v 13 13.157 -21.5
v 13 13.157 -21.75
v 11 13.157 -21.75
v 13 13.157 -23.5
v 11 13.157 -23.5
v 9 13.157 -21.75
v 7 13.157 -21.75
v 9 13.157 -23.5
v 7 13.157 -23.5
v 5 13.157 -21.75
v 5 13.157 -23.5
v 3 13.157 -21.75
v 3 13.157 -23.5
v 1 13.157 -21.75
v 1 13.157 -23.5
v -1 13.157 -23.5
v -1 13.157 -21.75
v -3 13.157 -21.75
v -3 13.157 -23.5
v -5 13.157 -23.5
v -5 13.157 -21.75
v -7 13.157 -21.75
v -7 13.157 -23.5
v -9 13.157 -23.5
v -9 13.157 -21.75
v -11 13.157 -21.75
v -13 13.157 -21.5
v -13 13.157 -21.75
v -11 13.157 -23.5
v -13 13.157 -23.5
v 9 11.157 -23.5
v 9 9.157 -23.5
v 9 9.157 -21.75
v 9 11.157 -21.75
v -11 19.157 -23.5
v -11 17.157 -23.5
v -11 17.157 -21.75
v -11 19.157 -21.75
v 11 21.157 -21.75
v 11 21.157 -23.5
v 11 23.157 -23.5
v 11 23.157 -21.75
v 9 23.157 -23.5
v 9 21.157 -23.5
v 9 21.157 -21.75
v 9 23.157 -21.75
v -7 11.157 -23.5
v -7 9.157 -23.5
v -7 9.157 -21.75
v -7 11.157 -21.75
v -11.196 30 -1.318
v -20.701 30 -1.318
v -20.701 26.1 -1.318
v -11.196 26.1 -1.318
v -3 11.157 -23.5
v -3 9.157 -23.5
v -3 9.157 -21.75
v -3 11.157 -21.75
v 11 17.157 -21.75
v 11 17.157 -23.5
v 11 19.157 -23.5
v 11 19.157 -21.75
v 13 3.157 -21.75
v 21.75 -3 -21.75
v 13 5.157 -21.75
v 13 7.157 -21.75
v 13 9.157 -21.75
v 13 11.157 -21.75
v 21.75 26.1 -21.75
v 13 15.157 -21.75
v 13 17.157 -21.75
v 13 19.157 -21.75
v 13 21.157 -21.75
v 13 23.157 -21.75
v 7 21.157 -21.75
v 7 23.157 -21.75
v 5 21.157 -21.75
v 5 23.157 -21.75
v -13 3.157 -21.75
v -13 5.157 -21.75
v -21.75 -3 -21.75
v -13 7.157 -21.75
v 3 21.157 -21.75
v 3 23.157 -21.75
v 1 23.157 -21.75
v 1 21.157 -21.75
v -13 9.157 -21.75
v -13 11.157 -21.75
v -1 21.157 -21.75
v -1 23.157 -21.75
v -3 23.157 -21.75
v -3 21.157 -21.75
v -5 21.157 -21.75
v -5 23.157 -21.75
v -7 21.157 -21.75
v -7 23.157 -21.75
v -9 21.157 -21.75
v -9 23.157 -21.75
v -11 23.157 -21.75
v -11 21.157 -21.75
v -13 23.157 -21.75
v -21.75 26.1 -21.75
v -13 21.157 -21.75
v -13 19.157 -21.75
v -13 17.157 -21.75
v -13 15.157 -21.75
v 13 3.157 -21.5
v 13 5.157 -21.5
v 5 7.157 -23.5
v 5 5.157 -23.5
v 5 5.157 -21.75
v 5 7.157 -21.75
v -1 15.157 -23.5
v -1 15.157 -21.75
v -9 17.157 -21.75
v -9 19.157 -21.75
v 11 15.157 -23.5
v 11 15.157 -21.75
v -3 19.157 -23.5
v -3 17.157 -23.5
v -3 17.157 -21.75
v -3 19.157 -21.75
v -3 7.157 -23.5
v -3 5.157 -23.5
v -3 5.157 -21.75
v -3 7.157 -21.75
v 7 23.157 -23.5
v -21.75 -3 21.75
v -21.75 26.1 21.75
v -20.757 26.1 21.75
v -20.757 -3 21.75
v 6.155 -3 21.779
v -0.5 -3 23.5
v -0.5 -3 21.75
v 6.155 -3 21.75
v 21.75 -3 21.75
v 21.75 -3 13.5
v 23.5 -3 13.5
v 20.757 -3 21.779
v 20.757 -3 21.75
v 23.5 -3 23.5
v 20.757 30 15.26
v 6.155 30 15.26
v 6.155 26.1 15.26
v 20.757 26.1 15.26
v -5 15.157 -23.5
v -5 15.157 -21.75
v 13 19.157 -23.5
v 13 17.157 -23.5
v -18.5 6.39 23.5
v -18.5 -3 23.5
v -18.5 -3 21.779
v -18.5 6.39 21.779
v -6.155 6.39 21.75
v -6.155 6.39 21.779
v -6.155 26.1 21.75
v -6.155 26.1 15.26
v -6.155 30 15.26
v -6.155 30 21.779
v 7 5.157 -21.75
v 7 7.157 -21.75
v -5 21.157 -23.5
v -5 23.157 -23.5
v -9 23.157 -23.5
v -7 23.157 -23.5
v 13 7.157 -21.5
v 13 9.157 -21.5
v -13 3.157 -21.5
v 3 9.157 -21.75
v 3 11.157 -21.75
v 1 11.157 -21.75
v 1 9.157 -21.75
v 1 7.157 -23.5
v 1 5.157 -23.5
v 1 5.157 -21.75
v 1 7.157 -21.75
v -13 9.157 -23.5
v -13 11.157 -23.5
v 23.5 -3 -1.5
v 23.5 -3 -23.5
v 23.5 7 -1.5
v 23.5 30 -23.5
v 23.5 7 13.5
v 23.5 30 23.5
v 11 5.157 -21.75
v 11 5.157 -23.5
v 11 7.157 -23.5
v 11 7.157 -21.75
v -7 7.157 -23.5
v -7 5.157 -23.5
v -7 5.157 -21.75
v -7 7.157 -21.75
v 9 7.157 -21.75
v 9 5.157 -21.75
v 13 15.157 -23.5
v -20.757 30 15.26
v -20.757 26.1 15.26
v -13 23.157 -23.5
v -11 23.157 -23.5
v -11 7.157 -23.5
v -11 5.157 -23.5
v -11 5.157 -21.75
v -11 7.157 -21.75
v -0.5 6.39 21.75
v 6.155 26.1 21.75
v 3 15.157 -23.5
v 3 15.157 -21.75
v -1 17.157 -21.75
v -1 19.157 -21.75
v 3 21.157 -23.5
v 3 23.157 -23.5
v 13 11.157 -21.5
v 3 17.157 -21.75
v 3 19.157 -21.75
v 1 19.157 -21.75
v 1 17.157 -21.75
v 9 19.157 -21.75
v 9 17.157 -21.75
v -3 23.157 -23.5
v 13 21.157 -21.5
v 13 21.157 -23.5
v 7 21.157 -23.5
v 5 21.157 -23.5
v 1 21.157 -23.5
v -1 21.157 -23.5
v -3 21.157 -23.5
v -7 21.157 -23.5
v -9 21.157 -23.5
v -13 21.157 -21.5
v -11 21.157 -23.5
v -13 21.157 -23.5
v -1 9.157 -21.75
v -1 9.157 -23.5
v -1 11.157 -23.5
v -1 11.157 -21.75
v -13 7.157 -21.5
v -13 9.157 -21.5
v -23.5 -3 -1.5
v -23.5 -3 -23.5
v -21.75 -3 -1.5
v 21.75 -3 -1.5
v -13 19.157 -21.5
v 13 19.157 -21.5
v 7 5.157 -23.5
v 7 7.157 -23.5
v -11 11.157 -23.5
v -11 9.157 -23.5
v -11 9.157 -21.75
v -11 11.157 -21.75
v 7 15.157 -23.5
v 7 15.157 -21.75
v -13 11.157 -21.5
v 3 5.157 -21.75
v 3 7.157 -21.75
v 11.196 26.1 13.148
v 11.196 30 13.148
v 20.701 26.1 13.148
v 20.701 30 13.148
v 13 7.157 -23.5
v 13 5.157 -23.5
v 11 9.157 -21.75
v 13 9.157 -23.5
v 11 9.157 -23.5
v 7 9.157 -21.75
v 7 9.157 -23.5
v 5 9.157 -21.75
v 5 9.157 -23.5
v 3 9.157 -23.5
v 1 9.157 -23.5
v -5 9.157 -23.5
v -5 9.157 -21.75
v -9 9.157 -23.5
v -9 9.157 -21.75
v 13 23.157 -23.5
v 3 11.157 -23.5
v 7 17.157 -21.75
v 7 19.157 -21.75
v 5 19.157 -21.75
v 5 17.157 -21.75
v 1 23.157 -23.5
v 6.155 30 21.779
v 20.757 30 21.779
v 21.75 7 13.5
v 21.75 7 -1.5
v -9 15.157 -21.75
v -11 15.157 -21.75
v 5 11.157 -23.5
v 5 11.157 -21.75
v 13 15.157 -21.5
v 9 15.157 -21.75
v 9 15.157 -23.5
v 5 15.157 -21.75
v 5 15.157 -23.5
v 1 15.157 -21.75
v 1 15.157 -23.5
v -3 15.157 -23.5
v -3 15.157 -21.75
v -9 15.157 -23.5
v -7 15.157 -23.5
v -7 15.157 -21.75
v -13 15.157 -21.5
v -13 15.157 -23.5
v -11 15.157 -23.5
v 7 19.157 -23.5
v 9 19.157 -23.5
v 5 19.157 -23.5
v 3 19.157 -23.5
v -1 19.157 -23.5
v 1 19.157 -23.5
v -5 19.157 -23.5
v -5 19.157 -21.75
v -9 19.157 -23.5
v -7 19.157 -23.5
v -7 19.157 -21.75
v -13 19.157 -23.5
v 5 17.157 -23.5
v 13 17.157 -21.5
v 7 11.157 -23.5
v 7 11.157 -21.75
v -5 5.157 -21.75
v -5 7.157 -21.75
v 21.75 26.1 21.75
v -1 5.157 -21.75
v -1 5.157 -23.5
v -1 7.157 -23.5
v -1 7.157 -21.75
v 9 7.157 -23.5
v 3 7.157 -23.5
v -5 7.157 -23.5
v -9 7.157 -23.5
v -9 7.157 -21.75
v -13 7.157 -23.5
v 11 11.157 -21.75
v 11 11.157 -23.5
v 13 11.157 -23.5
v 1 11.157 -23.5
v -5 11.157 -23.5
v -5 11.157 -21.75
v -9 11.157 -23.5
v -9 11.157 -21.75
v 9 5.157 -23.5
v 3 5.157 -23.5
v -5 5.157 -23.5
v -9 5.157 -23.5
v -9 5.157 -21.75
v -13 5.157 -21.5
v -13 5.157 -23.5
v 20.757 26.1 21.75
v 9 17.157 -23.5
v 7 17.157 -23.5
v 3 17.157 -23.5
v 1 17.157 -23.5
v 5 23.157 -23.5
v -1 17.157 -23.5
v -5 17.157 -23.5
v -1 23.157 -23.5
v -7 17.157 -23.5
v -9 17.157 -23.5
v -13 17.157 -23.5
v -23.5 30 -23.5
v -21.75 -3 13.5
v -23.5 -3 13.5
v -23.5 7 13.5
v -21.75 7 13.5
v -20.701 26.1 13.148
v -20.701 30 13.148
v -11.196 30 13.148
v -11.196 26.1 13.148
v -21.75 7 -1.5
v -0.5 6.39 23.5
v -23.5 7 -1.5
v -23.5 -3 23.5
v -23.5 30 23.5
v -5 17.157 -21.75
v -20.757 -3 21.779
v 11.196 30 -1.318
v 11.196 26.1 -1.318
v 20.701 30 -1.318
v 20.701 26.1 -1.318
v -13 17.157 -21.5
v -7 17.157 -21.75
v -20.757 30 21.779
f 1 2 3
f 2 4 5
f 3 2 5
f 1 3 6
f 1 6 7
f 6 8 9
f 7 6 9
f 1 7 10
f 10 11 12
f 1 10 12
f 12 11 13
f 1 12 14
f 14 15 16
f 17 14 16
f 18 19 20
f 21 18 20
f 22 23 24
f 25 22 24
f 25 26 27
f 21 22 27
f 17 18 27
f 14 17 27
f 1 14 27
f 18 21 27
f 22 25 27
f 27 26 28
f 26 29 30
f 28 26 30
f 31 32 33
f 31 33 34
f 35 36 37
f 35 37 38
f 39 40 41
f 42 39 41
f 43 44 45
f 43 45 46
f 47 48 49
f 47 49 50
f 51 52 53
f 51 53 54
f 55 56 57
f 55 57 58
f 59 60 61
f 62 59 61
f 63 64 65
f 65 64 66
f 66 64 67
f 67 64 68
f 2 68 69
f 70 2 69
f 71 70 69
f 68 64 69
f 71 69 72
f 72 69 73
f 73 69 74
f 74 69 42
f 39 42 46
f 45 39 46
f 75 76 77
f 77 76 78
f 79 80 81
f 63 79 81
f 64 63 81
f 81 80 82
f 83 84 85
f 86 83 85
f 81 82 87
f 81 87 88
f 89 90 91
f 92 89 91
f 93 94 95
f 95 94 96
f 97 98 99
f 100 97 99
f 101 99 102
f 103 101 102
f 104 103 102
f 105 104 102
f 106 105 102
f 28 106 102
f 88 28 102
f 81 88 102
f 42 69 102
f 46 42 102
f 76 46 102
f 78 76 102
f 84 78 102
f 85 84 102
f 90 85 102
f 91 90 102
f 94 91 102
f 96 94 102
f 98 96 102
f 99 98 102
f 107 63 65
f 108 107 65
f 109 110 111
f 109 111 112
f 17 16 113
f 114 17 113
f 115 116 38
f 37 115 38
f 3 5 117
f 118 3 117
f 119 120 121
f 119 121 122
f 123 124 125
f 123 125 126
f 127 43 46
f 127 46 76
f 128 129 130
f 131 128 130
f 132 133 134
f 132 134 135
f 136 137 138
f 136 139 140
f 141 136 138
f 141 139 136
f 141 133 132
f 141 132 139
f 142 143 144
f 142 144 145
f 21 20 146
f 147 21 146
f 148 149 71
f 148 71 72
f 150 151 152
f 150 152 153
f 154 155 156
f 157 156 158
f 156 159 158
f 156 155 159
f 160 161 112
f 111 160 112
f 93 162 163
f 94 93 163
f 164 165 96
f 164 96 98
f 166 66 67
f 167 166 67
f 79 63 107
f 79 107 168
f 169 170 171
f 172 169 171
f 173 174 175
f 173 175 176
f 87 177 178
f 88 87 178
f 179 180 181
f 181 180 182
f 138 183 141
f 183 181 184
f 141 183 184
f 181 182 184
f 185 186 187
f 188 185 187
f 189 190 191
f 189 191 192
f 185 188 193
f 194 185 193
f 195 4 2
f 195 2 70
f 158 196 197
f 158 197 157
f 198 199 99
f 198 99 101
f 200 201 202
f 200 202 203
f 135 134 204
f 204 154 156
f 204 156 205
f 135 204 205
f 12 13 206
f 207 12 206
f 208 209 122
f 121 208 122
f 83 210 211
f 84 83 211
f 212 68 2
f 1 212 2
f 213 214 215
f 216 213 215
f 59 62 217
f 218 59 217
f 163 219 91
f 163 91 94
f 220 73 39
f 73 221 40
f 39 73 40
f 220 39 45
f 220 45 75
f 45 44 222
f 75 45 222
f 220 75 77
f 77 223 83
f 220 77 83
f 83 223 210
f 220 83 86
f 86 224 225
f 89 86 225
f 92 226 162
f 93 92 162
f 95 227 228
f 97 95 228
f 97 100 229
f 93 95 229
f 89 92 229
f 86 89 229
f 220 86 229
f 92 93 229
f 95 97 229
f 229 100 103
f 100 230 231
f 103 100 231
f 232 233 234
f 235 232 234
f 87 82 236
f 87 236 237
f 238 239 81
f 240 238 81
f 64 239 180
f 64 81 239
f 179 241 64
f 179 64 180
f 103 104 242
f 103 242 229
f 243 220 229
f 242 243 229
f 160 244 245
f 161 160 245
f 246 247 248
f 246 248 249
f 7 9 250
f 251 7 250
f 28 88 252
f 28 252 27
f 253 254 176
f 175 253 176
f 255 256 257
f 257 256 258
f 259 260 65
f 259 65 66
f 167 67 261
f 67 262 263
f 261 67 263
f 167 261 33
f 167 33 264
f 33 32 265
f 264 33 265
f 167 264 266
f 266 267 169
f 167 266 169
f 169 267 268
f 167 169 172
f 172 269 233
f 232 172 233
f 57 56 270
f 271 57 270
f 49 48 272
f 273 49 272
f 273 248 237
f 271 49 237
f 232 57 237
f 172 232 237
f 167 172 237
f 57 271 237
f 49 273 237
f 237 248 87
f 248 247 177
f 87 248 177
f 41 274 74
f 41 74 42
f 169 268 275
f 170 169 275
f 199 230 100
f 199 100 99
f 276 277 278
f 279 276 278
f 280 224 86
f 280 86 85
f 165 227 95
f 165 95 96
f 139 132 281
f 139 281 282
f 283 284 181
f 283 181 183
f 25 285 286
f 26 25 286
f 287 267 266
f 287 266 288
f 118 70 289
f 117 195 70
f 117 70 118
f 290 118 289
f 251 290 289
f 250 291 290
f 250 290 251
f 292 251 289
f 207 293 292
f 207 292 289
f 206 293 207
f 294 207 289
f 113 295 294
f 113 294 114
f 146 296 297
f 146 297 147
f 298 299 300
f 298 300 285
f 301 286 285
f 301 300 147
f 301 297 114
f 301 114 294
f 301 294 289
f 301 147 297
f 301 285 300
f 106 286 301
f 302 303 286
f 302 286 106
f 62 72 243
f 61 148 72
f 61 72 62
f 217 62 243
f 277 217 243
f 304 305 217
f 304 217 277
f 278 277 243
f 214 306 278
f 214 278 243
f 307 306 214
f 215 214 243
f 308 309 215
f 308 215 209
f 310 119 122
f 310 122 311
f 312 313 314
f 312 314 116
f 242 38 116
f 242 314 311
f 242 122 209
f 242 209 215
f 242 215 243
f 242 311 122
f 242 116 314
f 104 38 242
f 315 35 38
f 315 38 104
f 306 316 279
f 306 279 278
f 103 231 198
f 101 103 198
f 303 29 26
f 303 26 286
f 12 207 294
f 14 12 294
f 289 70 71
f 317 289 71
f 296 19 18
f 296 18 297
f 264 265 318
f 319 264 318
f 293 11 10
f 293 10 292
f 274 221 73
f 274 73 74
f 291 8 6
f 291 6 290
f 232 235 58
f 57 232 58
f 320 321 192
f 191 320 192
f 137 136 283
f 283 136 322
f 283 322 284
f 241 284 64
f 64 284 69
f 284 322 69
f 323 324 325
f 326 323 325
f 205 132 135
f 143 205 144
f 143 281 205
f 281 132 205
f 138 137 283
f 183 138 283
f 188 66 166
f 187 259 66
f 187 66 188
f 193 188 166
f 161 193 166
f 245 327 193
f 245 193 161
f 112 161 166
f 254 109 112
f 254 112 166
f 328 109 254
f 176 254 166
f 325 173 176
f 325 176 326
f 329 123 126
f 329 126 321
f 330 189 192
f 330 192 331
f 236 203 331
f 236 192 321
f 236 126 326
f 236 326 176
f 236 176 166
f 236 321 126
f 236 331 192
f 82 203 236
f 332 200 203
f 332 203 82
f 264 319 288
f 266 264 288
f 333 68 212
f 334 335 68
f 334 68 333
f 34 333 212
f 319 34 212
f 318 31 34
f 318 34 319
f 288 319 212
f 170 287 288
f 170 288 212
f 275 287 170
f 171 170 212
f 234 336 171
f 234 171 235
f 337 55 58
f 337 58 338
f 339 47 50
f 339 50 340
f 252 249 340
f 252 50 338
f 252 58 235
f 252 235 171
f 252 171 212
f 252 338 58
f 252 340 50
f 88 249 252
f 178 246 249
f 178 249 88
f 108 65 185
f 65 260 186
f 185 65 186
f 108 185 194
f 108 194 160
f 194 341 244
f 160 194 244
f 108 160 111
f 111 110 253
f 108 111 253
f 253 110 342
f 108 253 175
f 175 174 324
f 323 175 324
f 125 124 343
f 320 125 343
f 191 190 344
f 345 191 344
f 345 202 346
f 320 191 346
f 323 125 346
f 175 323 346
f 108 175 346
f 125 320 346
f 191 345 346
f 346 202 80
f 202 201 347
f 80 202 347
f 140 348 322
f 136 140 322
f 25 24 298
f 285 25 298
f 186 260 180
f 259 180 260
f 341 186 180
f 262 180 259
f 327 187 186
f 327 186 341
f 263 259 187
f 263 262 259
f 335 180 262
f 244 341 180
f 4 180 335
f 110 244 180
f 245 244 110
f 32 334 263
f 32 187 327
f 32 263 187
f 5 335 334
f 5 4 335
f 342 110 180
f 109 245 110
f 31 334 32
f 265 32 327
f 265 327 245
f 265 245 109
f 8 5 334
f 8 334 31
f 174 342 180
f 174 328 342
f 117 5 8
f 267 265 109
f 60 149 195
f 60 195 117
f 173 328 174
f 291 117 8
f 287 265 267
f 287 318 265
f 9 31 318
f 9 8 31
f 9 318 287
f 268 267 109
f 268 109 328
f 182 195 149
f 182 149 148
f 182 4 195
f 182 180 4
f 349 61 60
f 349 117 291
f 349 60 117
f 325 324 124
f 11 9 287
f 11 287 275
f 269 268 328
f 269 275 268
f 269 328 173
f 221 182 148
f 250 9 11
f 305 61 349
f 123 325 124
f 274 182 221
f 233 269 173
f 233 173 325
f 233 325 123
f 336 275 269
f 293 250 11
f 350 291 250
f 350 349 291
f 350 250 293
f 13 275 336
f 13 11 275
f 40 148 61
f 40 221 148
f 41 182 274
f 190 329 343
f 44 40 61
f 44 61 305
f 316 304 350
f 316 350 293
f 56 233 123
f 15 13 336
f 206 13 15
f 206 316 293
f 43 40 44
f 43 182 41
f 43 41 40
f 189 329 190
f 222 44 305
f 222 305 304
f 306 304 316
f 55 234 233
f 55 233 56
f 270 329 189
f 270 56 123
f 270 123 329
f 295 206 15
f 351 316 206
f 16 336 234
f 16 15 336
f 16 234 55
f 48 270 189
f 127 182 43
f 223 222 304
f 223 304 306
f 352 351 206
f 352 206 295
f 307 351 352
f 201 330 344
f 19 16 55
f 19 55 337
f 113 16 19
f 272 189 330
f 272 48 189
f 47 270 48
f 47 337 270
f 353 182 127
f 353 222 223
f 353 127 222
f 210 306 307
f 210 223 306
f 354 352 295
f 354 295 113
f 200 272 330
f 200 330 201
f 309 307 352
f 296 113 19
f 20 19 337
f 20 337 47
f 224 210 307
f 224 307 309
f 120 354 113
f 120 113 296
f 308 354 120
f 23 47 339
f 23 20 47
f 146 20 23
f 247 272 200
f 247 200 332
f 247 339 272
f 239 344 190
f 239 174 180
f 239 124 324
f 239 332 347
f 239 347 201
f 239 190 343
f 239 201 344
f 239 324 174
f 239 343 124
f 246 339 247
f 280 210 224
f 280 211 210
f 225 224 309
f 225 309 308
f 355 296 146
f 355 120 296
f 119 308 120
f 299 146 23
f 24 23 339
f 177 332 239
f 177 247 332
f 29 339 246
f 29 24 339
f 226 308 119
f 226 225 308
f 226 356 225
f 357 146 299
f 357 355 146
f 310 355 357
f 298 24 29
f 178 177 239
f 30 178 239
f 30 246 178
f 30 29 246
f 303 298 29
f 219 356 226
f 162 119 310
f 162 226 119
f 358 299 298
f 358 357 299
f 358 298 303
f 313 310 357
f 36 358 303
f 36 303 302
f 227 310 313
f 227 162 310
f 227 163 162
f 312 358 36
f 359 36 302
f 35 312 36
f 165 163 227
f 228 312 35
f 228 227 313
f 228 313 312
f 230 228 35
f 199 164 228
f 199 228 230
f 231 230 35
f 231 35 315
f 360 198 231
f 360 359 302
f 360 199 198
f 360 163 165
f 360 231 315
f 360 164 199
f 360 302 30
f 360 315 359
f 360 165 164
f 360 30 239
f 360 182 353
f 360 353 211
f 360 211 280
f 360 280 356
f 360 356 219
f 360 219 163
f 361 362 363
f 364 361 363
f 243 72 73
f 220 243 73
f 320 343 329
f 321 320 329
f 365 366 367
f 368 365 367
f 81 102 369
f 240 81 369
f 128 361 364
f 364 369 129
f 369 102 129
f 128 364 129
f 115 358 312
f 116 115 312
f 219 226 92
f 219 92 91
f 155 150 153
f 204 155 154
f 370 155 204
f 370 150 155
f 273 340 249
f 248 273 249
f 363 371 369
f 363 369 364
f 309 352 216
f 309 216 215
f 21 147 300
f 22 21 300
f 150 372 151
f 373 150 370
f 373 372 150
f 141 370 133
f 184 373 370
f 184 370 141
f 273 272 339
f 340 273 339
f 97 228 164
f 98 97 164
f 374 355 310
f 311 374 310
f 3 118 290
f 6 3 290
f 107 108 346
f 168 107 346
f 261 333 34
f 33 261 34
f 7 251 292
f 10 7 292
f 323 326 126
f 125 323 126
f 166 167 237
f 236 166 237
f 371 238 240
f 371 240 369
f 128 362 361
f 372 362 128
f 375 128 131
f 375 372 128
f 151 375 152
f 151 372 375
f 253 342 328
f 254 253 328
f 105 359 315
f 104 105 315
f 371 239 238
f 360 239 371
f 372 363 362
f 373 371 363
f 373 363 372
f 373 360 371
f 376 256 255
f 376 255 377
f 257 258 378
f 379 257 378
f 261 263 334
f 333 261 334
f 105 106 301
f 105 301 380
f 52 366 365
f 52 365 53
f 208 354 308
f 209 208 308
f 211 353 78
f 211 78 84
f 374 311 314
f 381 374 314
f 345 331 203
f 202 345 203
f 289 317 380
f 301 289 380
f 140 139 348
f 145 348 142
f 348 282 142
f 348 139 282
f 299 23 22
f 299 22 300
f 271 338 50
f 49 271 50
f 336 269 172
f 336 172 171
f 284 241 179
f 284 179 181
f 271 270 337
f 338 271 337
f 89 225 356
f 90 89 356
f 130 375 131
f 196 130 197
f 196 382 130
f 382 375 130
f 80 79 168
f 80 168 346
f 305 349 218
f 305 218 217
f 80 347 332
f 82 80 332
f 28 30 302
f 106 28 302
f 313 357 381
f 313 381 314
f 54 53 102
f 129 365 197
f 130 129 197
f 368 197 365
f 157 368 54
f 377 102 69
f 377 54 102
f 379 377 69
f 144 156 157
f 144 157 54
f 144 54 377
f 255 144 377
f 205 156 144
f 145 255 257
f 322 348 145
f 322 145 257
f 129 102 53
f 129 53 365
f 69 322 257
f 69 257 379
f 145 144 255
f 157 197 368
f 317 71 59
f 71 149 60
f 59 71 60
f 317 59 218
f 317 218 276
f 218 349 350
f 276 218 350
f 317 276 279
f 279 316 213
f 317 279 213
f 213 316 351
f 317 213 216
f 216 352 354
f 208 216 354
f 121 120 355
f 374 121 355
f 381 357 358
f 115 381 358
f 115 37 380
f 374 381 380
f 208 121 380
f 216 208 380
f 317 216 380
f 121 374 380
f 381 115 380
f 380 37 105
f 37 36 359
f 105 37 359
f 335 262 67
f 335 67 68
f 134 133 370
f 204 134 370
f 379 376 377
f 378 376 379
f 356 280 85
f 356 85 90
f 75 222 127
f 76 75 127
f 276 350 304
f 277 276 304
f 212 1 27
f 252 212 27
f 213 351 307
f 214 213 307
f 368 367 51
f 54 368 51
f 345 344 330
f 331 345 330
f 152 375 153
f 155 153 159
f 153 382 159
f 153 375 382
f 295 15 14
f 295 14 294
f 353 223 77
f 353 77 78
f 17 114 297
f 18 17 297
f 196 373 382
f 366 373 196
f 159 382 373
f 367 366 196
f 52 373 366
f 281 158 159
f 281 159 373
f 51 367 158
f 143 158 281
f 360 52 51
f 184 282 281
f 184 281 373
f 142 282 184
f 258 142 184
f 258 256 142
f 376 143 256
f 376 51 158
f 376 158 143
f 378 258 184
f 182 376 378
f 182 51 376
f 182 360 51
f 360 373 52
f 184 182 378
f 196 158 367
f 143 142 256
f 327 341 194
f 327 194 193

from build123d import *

# Parameters (mm, degrees)
SKETCH1_W           = 47
SKETCH1_H           = 47
BOSS_EXTRUDE1_DEPTH = 30
SKETCH2_W           = 43.5
SKETCH2_H           = 43.5
CUT_EXTRUDE1_DEPTH  = 26.1
SKETCH5_W           = 47
SKETCH5_H           = 47
BOSS_EXTRUDE3_DEPTH = 3
CUT_EXTRUDE3_REACH  = 62.508
SKETCH4_W           = 2
SKETCH4_H           = 20
LPATTERN1_COUNT     = 7
LPATTERN1_PITCH     = 4
SKETCH8_W           = 26
SKETCH8_H           = 2
BOSS_EXTRUDE4_DEPTH = 2
LPATTERN2_COUNT     = 5
LPATTERN2_PITCH     = 4
SKETCH9_W           = 18
SKETCH9_H           = 9.389923451
CUT_EXTRUDE4_DEPTH  = 10
SKETCH10_W          = 15
SKETCH10_H          = 10
CUT_EXTRUDE5_DEPTH  = 61.508263898
SKETCH11_W          = 9.504801384
SKETCH11_H          = 14.465733587
SKETCH11_W_2        = 14.602344504
SKETCH11_H_2        = 6.519720082
CUT_EXTRUDE6_DEPTH  = 47.834816109


with BuildPart() as part:
    # Sketch1 → Boss-Extrude1 (new body)
    with BuildSketch(Plane(origin=(0, 0, 0), x_dir=(1, 0, 0), z_dir=(0, 1, 0))):
        Rectangle(SKETCH1_W, SKETCH1_H)
    extrude(amount=BOSS_EXTRUDE1_DEPTH)

    # Sketch2 → Cut-Extrude1 (cut)
    with BuildSketch(Plane.XZ):
        Rectangle(SKETCH2_W, SKETCH2_H)
    extrude(amount=-CUT_EXTRUDE1_DEPTH, mode=Mode.SUBTRACT)

    # Sketch5 → Boss-Extrude3 (add)
    with BuildSketch(Plane.XZ):
        Rectangle(SKETCH5_W, SKETCH5_H)
        Polygon((-16.6, 21.75), (-21.75, 21.75), (-21.75, 16.6), (-21.75, -16.6), (-21.75, -21.75), (-16.6, -21.75), (16.6, -21.75), (21.75, -21.75), (21.75, -16.6), (21.75, 16.6), (21.75, 21.75), (16.6, 21.75), align=None, mode=Mode.SUBTRACT)
    extrude(amount=BOSS_EXTRUDE3_DEPTH)

    # Sketch4 → Cut-Extrude3 (cut, up to next)
    with BuildSketch(Plane(origin=(0, 0, -23.5), x_dir=(-1, 0, 0), z_dir=(0, 0, -1)), mode=Mode.PRIVATE) as cut_extrude3_sk1:
        with Locations((-12, 13.157296847)):
            Rectangle(SKETCH4_W, SKETCH4_H)
    cut_extrude3_tool1 = extrude(cut_extrude3_sk1.sketch, amount=-CUT_EXTRUDE3_REACH, mode=Mode.PRIVATE) & part.part
    cut_extrude3 = cut_extrude3_tool1.solids().sort_by_distance((12, 13.157297, -23.5))[0]
    add(cut_extrude3, mode=Mode.SUBTRACT)

    # LPattern1: Cut-Extrude3 ×7
    with Locations(*[(-i * LPATTERN1_PITCH, 0, 0) for i in range(1, LPATTERN1_COUNT)]):
        add(cut_extrude3, mode=Mode.SUBTRACT)

    # Sketch8 → Boss-Extrude4 (add)
    with BuildSketch(Plane(origin=(0, 0, -23.5), x_dir=(-1, 0, 0), z_dir=(0, 0, -1))):
        with Locations((0, 20.157296847)):
            Rectangle(SKETCH8_W, SKETCH8_H)
    boss_extrude4 = extrude(amount=-BOSS_EXTRUDE4_DEPTH)

    # LPattern2: Boss-Extrude4 ×5
    with Locations(*[(0, -i * LPATTERN2_PITCH, 0) for i in range(1, LPATTERN2_COUNT)]):
        add(boss_extrude4)

    # Sketch9 → Cut-Extrude4 (cut)
    with BuildSketch(Plane.XY.offset(23.5)):
        with Locations((-9.5, 1.694961726)):
            Rectangle(SKETCH9_W, SKETCH9_H)
    extrude(amount=-CUT_EXTRUDE4_DEPTH, mode=Mode.SUBTRACT)

    # Sketch10 → Cut-Extrude5 (cut, through all)
    with BuildSketch(Plane.ZY.offset(23.5)):
        with Locations((6, 2)):
            Rectangle(SKETCH10_W, SKETCH10_H)
    extrude(amount=-CUT_EXTRUDE5_DEPTH, mode=Mode.SUBTRACT)

    # Sketch11 → Cut-Extrude6 (cut, through all)
    with BuildSketch(Plane(origin=(0, 30, 0), x_dir=(1, 0, 0), z_dir=(0, 1, 0))):
        with Locations((-15.948112, -5.914939324)):
            Rectangle(SKETCH11_W, SKETCH11_H)
        with Locations((-13.45587944, -18.519566616)):
            Rectangle(SKETCH11_W_2, SKETCH11_H_2)
        with Locations((15.948112, -5.914939324)):
            Rectangle(SKETCH11_W, SKETCH11_H)
        with Locations((13.45587944, -18.519566616)):
            Rectangle(SKETCH11_W_2, SKETCH11_H_2)
    extrude(amount=-CUT_EXTRUDE6_DEPTH, mode=Mode.SUBTRACT)


solid = part.part
